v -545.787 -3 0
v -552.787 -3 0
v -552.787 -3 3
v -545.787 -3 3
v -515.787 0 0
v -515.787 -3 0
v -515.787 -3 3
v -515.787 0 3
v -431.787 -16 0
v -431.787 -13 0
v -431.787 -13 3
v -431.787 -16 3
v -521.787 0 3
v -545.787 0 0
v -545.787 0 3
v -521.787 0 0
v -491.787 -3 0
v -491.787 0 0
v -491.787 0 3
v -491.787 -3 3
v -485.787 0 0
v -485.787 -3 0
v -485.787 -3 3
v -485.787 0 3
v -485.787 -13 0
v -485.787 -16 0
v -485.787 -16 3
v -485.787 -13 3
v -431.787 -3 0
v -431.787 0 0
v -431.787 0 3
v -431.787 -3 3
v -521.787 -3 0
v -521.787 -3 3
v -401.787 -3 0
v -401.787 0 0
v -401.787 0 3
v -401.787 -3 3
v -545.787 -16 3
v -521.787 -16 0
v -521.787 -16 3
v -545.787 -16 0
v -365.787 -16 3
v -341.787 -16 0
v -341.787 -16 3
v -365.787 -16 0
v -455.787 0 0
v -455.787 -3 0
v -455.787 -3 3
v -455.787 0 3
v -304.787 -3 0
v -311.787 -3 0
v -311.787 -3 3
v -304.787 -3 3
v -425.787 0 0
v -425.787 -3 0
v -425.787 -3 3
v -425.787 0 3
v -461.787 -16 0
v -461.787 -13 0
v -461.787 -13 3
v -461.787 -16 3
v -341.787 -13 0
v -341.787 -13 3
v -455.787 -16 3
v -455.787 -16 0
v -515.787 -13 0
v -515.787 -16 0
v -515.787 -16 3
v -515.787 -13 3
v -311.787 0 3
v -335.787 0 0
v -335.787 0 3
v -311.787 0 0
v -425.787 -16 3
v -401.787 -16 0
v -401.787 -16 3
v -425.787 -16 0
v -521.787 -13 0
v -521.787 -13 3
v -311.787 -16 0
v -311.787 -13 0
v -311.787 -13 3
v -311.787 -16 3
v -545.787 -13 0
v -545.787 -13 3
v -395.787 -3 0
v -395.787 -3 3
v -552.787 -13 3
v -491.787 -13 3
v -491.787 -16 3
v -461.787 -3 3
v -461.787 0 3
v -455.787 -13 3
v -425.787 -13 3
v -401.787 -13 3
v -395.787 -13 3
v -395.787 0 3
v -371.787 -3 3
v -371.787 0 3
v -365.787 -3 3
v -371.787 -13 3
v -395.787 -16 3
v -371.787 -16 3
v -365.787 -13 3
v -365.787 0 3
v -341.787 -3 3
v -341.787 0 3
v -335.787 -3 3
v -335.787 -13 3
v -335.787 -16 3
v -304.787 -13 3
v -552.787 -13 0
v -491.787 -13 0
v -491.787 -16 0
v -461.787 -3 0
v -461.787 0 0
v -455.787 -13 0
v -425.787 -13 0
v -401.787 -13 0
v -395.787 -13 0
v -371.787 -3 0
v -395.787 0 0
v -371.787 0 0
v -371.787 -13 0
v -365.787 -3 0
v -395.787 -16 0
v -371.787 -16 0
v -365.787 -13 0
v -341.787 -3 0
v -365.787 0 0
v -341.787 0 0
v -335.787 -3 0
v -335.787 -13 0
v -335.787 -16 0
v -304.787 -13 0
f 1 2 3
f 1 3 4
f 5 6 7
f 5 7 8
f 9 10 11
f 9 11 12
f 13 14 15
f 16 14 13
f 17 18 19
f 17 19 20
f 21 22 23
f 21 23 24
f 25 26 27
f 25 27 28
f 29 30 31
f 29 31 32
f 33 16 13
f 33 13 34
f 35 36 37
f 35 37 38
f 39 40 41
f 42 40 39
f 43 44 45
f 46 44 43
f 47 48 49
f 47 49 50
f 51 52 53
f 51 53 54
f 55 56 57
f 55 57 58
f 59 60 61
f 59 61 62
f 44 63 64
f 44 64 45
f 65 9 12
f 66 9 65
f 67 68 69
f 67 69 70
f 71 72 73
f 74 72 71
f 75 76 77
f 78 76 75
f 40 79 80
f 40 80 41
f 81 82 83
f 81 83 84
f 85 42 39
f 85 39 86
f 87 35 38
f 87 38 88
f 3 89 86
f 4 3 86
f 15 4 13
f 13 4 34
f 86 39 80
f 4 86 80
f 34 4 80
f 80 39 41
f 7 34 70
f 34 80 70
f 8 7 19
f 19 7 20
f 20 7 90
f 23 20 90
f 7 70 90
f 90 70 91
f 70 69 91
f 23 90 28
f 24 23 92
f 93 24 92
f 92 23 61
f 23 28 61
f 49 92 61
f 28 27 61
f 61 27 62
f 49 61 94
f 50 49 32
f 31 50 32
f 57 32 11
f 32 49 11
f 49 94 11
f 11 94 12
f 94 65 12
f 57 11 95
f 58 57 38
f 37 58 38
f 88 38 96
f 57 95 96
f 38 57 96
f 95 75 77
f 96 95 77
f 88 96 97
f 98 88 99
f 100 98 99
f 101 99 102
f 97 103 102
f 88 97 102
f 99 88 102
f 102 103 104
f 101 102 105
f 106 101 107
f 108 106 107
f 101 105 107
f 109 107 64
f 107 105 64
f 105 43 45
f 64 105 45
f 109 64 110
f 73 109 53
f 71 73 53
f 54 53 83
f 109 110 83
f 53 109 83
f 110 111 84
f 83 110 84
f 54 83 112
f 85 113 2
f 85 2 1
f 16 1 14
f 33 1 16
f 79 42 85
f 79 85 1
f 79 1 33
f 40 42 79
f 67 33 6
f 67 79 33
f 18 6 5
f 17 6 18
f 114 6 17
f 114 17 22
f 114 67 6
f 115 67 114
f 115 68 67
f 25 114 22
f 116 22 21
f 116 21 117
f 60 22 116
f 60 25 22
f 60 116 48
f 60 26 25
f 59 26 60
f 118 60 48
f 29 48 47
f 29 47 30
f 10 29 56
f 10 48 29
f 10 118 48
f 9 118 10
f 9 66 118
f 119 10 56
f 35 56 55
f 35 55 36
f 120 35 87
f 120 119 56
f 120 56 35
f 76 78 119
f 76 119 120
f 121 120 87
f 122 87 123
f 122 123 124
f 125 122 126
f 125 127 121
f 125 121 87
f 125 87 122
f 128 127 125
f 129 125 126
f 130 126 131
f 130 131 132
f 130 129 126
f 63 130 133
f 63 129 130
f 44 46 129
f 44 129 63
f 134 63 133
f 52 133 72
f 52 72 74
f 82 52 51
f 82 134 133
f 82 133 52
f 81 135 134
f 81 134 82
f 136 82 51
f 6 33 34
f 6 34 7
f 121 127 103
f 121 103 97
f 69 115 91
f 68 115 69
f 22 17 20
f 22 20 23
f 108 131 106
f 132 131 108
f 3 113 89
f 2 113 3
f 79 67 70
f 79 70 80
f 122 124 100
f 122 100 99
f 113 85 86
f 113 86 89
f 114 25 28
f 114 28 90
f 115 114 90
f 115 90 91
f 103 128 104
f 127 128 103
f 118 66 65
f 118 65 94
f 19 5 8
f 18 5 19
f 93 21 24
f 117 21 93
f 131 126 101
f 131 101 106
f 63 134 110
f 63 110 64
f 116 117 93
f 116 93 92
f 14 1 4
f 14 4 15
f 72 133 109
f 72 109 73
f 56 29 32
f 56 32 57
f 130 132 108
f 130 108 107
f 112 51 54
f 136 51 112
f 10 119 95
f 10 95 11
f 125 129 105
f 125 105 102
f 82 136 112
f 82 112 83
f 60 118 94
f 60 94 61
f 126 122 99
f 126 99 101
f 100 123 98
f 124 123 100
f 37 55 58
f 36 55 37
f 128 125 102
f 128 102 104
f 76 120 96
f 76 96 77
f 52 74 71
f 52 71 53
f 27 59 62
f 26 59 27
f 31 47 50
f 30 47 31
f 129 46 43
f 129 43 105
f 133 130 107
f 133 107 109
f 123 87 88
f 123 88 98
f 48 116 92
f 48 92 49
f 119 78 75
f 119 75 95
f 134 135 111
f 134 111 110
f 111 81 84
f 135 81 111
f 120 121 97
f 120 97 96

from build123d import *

# Parameters (mm, degrees)
BOSS_EXTRUDE1_DEPTH = 3


with BuildPart() as part:
    # Sketch1 → Boss-Extrude1 (new body)
    with BuildSketch(Plane(origin=(0, 0, 0), x_dir=(-1, 0, 0), z_dir=(0, 0, 1))):
        Polygon((545.787224347, 3), (545.787224347, 0), (521.787224347, 0), (521.787224347, 3), (515.787224347, 3), (515.787224347, 0), (491.787224347, 0), (491.787224347, 3), (485.787224347, 3), (485.787224347, 0), (461.787224347, 0), (461.787224347, 3), (455.787224347, 3), (455.787224347, 0), (431.787224347, 0), (431.787224347, 3), (425.787224347, 3), (425.787224347, 0), (401.787224347, 0), (401.787224347, 3), (395.787224347, 3), (395.787224347, 0), (371.787224347, 0), (371.787224347, 3), (365.787224347, 3), (365.787224347, 0), (341.787224347, 0), (341.787224347, 3), (335.787224347, 3), (335.787224347, 0), (311.787224347, 0), (311.787224347, 3), (304.787224347, 3), (304.787224347, 13), (311.787224347, 13), (311.787224347, 16), (335.787224347, 16), (335.787224347, 13), (341.787224347, 13), (341.787224347, 16), (365.787224347, 16), (365.787224347, 13), (371.787224347, 13), (371.787224347, 16), (395.787224347, 16), (395.787224347, 13), (401.787224347, 13), (401.787224347, 16), (425.787224347, 16), (425.787224347, 13), (431.787224347, 13), (431.787224347, 16), (455.787224347, 16), (455.787224347, 13), (461.787224347, 13), (461.787224347, 16), (485.787224347, 16), (485.787224347, 13), (491.787224347, 13), (491.787224347, 16), (515.787224347, 16), (515.787224347, 13), (521.787224347, 13), (521.787224347, 16), (545.787224347, 16), (545.787224347, 13), (552.787224347, 13), (552.787224347, 3), align=None)
    extrude(amount=BOSS_EXTRUDE1_DEPTH)


solid = part.part
